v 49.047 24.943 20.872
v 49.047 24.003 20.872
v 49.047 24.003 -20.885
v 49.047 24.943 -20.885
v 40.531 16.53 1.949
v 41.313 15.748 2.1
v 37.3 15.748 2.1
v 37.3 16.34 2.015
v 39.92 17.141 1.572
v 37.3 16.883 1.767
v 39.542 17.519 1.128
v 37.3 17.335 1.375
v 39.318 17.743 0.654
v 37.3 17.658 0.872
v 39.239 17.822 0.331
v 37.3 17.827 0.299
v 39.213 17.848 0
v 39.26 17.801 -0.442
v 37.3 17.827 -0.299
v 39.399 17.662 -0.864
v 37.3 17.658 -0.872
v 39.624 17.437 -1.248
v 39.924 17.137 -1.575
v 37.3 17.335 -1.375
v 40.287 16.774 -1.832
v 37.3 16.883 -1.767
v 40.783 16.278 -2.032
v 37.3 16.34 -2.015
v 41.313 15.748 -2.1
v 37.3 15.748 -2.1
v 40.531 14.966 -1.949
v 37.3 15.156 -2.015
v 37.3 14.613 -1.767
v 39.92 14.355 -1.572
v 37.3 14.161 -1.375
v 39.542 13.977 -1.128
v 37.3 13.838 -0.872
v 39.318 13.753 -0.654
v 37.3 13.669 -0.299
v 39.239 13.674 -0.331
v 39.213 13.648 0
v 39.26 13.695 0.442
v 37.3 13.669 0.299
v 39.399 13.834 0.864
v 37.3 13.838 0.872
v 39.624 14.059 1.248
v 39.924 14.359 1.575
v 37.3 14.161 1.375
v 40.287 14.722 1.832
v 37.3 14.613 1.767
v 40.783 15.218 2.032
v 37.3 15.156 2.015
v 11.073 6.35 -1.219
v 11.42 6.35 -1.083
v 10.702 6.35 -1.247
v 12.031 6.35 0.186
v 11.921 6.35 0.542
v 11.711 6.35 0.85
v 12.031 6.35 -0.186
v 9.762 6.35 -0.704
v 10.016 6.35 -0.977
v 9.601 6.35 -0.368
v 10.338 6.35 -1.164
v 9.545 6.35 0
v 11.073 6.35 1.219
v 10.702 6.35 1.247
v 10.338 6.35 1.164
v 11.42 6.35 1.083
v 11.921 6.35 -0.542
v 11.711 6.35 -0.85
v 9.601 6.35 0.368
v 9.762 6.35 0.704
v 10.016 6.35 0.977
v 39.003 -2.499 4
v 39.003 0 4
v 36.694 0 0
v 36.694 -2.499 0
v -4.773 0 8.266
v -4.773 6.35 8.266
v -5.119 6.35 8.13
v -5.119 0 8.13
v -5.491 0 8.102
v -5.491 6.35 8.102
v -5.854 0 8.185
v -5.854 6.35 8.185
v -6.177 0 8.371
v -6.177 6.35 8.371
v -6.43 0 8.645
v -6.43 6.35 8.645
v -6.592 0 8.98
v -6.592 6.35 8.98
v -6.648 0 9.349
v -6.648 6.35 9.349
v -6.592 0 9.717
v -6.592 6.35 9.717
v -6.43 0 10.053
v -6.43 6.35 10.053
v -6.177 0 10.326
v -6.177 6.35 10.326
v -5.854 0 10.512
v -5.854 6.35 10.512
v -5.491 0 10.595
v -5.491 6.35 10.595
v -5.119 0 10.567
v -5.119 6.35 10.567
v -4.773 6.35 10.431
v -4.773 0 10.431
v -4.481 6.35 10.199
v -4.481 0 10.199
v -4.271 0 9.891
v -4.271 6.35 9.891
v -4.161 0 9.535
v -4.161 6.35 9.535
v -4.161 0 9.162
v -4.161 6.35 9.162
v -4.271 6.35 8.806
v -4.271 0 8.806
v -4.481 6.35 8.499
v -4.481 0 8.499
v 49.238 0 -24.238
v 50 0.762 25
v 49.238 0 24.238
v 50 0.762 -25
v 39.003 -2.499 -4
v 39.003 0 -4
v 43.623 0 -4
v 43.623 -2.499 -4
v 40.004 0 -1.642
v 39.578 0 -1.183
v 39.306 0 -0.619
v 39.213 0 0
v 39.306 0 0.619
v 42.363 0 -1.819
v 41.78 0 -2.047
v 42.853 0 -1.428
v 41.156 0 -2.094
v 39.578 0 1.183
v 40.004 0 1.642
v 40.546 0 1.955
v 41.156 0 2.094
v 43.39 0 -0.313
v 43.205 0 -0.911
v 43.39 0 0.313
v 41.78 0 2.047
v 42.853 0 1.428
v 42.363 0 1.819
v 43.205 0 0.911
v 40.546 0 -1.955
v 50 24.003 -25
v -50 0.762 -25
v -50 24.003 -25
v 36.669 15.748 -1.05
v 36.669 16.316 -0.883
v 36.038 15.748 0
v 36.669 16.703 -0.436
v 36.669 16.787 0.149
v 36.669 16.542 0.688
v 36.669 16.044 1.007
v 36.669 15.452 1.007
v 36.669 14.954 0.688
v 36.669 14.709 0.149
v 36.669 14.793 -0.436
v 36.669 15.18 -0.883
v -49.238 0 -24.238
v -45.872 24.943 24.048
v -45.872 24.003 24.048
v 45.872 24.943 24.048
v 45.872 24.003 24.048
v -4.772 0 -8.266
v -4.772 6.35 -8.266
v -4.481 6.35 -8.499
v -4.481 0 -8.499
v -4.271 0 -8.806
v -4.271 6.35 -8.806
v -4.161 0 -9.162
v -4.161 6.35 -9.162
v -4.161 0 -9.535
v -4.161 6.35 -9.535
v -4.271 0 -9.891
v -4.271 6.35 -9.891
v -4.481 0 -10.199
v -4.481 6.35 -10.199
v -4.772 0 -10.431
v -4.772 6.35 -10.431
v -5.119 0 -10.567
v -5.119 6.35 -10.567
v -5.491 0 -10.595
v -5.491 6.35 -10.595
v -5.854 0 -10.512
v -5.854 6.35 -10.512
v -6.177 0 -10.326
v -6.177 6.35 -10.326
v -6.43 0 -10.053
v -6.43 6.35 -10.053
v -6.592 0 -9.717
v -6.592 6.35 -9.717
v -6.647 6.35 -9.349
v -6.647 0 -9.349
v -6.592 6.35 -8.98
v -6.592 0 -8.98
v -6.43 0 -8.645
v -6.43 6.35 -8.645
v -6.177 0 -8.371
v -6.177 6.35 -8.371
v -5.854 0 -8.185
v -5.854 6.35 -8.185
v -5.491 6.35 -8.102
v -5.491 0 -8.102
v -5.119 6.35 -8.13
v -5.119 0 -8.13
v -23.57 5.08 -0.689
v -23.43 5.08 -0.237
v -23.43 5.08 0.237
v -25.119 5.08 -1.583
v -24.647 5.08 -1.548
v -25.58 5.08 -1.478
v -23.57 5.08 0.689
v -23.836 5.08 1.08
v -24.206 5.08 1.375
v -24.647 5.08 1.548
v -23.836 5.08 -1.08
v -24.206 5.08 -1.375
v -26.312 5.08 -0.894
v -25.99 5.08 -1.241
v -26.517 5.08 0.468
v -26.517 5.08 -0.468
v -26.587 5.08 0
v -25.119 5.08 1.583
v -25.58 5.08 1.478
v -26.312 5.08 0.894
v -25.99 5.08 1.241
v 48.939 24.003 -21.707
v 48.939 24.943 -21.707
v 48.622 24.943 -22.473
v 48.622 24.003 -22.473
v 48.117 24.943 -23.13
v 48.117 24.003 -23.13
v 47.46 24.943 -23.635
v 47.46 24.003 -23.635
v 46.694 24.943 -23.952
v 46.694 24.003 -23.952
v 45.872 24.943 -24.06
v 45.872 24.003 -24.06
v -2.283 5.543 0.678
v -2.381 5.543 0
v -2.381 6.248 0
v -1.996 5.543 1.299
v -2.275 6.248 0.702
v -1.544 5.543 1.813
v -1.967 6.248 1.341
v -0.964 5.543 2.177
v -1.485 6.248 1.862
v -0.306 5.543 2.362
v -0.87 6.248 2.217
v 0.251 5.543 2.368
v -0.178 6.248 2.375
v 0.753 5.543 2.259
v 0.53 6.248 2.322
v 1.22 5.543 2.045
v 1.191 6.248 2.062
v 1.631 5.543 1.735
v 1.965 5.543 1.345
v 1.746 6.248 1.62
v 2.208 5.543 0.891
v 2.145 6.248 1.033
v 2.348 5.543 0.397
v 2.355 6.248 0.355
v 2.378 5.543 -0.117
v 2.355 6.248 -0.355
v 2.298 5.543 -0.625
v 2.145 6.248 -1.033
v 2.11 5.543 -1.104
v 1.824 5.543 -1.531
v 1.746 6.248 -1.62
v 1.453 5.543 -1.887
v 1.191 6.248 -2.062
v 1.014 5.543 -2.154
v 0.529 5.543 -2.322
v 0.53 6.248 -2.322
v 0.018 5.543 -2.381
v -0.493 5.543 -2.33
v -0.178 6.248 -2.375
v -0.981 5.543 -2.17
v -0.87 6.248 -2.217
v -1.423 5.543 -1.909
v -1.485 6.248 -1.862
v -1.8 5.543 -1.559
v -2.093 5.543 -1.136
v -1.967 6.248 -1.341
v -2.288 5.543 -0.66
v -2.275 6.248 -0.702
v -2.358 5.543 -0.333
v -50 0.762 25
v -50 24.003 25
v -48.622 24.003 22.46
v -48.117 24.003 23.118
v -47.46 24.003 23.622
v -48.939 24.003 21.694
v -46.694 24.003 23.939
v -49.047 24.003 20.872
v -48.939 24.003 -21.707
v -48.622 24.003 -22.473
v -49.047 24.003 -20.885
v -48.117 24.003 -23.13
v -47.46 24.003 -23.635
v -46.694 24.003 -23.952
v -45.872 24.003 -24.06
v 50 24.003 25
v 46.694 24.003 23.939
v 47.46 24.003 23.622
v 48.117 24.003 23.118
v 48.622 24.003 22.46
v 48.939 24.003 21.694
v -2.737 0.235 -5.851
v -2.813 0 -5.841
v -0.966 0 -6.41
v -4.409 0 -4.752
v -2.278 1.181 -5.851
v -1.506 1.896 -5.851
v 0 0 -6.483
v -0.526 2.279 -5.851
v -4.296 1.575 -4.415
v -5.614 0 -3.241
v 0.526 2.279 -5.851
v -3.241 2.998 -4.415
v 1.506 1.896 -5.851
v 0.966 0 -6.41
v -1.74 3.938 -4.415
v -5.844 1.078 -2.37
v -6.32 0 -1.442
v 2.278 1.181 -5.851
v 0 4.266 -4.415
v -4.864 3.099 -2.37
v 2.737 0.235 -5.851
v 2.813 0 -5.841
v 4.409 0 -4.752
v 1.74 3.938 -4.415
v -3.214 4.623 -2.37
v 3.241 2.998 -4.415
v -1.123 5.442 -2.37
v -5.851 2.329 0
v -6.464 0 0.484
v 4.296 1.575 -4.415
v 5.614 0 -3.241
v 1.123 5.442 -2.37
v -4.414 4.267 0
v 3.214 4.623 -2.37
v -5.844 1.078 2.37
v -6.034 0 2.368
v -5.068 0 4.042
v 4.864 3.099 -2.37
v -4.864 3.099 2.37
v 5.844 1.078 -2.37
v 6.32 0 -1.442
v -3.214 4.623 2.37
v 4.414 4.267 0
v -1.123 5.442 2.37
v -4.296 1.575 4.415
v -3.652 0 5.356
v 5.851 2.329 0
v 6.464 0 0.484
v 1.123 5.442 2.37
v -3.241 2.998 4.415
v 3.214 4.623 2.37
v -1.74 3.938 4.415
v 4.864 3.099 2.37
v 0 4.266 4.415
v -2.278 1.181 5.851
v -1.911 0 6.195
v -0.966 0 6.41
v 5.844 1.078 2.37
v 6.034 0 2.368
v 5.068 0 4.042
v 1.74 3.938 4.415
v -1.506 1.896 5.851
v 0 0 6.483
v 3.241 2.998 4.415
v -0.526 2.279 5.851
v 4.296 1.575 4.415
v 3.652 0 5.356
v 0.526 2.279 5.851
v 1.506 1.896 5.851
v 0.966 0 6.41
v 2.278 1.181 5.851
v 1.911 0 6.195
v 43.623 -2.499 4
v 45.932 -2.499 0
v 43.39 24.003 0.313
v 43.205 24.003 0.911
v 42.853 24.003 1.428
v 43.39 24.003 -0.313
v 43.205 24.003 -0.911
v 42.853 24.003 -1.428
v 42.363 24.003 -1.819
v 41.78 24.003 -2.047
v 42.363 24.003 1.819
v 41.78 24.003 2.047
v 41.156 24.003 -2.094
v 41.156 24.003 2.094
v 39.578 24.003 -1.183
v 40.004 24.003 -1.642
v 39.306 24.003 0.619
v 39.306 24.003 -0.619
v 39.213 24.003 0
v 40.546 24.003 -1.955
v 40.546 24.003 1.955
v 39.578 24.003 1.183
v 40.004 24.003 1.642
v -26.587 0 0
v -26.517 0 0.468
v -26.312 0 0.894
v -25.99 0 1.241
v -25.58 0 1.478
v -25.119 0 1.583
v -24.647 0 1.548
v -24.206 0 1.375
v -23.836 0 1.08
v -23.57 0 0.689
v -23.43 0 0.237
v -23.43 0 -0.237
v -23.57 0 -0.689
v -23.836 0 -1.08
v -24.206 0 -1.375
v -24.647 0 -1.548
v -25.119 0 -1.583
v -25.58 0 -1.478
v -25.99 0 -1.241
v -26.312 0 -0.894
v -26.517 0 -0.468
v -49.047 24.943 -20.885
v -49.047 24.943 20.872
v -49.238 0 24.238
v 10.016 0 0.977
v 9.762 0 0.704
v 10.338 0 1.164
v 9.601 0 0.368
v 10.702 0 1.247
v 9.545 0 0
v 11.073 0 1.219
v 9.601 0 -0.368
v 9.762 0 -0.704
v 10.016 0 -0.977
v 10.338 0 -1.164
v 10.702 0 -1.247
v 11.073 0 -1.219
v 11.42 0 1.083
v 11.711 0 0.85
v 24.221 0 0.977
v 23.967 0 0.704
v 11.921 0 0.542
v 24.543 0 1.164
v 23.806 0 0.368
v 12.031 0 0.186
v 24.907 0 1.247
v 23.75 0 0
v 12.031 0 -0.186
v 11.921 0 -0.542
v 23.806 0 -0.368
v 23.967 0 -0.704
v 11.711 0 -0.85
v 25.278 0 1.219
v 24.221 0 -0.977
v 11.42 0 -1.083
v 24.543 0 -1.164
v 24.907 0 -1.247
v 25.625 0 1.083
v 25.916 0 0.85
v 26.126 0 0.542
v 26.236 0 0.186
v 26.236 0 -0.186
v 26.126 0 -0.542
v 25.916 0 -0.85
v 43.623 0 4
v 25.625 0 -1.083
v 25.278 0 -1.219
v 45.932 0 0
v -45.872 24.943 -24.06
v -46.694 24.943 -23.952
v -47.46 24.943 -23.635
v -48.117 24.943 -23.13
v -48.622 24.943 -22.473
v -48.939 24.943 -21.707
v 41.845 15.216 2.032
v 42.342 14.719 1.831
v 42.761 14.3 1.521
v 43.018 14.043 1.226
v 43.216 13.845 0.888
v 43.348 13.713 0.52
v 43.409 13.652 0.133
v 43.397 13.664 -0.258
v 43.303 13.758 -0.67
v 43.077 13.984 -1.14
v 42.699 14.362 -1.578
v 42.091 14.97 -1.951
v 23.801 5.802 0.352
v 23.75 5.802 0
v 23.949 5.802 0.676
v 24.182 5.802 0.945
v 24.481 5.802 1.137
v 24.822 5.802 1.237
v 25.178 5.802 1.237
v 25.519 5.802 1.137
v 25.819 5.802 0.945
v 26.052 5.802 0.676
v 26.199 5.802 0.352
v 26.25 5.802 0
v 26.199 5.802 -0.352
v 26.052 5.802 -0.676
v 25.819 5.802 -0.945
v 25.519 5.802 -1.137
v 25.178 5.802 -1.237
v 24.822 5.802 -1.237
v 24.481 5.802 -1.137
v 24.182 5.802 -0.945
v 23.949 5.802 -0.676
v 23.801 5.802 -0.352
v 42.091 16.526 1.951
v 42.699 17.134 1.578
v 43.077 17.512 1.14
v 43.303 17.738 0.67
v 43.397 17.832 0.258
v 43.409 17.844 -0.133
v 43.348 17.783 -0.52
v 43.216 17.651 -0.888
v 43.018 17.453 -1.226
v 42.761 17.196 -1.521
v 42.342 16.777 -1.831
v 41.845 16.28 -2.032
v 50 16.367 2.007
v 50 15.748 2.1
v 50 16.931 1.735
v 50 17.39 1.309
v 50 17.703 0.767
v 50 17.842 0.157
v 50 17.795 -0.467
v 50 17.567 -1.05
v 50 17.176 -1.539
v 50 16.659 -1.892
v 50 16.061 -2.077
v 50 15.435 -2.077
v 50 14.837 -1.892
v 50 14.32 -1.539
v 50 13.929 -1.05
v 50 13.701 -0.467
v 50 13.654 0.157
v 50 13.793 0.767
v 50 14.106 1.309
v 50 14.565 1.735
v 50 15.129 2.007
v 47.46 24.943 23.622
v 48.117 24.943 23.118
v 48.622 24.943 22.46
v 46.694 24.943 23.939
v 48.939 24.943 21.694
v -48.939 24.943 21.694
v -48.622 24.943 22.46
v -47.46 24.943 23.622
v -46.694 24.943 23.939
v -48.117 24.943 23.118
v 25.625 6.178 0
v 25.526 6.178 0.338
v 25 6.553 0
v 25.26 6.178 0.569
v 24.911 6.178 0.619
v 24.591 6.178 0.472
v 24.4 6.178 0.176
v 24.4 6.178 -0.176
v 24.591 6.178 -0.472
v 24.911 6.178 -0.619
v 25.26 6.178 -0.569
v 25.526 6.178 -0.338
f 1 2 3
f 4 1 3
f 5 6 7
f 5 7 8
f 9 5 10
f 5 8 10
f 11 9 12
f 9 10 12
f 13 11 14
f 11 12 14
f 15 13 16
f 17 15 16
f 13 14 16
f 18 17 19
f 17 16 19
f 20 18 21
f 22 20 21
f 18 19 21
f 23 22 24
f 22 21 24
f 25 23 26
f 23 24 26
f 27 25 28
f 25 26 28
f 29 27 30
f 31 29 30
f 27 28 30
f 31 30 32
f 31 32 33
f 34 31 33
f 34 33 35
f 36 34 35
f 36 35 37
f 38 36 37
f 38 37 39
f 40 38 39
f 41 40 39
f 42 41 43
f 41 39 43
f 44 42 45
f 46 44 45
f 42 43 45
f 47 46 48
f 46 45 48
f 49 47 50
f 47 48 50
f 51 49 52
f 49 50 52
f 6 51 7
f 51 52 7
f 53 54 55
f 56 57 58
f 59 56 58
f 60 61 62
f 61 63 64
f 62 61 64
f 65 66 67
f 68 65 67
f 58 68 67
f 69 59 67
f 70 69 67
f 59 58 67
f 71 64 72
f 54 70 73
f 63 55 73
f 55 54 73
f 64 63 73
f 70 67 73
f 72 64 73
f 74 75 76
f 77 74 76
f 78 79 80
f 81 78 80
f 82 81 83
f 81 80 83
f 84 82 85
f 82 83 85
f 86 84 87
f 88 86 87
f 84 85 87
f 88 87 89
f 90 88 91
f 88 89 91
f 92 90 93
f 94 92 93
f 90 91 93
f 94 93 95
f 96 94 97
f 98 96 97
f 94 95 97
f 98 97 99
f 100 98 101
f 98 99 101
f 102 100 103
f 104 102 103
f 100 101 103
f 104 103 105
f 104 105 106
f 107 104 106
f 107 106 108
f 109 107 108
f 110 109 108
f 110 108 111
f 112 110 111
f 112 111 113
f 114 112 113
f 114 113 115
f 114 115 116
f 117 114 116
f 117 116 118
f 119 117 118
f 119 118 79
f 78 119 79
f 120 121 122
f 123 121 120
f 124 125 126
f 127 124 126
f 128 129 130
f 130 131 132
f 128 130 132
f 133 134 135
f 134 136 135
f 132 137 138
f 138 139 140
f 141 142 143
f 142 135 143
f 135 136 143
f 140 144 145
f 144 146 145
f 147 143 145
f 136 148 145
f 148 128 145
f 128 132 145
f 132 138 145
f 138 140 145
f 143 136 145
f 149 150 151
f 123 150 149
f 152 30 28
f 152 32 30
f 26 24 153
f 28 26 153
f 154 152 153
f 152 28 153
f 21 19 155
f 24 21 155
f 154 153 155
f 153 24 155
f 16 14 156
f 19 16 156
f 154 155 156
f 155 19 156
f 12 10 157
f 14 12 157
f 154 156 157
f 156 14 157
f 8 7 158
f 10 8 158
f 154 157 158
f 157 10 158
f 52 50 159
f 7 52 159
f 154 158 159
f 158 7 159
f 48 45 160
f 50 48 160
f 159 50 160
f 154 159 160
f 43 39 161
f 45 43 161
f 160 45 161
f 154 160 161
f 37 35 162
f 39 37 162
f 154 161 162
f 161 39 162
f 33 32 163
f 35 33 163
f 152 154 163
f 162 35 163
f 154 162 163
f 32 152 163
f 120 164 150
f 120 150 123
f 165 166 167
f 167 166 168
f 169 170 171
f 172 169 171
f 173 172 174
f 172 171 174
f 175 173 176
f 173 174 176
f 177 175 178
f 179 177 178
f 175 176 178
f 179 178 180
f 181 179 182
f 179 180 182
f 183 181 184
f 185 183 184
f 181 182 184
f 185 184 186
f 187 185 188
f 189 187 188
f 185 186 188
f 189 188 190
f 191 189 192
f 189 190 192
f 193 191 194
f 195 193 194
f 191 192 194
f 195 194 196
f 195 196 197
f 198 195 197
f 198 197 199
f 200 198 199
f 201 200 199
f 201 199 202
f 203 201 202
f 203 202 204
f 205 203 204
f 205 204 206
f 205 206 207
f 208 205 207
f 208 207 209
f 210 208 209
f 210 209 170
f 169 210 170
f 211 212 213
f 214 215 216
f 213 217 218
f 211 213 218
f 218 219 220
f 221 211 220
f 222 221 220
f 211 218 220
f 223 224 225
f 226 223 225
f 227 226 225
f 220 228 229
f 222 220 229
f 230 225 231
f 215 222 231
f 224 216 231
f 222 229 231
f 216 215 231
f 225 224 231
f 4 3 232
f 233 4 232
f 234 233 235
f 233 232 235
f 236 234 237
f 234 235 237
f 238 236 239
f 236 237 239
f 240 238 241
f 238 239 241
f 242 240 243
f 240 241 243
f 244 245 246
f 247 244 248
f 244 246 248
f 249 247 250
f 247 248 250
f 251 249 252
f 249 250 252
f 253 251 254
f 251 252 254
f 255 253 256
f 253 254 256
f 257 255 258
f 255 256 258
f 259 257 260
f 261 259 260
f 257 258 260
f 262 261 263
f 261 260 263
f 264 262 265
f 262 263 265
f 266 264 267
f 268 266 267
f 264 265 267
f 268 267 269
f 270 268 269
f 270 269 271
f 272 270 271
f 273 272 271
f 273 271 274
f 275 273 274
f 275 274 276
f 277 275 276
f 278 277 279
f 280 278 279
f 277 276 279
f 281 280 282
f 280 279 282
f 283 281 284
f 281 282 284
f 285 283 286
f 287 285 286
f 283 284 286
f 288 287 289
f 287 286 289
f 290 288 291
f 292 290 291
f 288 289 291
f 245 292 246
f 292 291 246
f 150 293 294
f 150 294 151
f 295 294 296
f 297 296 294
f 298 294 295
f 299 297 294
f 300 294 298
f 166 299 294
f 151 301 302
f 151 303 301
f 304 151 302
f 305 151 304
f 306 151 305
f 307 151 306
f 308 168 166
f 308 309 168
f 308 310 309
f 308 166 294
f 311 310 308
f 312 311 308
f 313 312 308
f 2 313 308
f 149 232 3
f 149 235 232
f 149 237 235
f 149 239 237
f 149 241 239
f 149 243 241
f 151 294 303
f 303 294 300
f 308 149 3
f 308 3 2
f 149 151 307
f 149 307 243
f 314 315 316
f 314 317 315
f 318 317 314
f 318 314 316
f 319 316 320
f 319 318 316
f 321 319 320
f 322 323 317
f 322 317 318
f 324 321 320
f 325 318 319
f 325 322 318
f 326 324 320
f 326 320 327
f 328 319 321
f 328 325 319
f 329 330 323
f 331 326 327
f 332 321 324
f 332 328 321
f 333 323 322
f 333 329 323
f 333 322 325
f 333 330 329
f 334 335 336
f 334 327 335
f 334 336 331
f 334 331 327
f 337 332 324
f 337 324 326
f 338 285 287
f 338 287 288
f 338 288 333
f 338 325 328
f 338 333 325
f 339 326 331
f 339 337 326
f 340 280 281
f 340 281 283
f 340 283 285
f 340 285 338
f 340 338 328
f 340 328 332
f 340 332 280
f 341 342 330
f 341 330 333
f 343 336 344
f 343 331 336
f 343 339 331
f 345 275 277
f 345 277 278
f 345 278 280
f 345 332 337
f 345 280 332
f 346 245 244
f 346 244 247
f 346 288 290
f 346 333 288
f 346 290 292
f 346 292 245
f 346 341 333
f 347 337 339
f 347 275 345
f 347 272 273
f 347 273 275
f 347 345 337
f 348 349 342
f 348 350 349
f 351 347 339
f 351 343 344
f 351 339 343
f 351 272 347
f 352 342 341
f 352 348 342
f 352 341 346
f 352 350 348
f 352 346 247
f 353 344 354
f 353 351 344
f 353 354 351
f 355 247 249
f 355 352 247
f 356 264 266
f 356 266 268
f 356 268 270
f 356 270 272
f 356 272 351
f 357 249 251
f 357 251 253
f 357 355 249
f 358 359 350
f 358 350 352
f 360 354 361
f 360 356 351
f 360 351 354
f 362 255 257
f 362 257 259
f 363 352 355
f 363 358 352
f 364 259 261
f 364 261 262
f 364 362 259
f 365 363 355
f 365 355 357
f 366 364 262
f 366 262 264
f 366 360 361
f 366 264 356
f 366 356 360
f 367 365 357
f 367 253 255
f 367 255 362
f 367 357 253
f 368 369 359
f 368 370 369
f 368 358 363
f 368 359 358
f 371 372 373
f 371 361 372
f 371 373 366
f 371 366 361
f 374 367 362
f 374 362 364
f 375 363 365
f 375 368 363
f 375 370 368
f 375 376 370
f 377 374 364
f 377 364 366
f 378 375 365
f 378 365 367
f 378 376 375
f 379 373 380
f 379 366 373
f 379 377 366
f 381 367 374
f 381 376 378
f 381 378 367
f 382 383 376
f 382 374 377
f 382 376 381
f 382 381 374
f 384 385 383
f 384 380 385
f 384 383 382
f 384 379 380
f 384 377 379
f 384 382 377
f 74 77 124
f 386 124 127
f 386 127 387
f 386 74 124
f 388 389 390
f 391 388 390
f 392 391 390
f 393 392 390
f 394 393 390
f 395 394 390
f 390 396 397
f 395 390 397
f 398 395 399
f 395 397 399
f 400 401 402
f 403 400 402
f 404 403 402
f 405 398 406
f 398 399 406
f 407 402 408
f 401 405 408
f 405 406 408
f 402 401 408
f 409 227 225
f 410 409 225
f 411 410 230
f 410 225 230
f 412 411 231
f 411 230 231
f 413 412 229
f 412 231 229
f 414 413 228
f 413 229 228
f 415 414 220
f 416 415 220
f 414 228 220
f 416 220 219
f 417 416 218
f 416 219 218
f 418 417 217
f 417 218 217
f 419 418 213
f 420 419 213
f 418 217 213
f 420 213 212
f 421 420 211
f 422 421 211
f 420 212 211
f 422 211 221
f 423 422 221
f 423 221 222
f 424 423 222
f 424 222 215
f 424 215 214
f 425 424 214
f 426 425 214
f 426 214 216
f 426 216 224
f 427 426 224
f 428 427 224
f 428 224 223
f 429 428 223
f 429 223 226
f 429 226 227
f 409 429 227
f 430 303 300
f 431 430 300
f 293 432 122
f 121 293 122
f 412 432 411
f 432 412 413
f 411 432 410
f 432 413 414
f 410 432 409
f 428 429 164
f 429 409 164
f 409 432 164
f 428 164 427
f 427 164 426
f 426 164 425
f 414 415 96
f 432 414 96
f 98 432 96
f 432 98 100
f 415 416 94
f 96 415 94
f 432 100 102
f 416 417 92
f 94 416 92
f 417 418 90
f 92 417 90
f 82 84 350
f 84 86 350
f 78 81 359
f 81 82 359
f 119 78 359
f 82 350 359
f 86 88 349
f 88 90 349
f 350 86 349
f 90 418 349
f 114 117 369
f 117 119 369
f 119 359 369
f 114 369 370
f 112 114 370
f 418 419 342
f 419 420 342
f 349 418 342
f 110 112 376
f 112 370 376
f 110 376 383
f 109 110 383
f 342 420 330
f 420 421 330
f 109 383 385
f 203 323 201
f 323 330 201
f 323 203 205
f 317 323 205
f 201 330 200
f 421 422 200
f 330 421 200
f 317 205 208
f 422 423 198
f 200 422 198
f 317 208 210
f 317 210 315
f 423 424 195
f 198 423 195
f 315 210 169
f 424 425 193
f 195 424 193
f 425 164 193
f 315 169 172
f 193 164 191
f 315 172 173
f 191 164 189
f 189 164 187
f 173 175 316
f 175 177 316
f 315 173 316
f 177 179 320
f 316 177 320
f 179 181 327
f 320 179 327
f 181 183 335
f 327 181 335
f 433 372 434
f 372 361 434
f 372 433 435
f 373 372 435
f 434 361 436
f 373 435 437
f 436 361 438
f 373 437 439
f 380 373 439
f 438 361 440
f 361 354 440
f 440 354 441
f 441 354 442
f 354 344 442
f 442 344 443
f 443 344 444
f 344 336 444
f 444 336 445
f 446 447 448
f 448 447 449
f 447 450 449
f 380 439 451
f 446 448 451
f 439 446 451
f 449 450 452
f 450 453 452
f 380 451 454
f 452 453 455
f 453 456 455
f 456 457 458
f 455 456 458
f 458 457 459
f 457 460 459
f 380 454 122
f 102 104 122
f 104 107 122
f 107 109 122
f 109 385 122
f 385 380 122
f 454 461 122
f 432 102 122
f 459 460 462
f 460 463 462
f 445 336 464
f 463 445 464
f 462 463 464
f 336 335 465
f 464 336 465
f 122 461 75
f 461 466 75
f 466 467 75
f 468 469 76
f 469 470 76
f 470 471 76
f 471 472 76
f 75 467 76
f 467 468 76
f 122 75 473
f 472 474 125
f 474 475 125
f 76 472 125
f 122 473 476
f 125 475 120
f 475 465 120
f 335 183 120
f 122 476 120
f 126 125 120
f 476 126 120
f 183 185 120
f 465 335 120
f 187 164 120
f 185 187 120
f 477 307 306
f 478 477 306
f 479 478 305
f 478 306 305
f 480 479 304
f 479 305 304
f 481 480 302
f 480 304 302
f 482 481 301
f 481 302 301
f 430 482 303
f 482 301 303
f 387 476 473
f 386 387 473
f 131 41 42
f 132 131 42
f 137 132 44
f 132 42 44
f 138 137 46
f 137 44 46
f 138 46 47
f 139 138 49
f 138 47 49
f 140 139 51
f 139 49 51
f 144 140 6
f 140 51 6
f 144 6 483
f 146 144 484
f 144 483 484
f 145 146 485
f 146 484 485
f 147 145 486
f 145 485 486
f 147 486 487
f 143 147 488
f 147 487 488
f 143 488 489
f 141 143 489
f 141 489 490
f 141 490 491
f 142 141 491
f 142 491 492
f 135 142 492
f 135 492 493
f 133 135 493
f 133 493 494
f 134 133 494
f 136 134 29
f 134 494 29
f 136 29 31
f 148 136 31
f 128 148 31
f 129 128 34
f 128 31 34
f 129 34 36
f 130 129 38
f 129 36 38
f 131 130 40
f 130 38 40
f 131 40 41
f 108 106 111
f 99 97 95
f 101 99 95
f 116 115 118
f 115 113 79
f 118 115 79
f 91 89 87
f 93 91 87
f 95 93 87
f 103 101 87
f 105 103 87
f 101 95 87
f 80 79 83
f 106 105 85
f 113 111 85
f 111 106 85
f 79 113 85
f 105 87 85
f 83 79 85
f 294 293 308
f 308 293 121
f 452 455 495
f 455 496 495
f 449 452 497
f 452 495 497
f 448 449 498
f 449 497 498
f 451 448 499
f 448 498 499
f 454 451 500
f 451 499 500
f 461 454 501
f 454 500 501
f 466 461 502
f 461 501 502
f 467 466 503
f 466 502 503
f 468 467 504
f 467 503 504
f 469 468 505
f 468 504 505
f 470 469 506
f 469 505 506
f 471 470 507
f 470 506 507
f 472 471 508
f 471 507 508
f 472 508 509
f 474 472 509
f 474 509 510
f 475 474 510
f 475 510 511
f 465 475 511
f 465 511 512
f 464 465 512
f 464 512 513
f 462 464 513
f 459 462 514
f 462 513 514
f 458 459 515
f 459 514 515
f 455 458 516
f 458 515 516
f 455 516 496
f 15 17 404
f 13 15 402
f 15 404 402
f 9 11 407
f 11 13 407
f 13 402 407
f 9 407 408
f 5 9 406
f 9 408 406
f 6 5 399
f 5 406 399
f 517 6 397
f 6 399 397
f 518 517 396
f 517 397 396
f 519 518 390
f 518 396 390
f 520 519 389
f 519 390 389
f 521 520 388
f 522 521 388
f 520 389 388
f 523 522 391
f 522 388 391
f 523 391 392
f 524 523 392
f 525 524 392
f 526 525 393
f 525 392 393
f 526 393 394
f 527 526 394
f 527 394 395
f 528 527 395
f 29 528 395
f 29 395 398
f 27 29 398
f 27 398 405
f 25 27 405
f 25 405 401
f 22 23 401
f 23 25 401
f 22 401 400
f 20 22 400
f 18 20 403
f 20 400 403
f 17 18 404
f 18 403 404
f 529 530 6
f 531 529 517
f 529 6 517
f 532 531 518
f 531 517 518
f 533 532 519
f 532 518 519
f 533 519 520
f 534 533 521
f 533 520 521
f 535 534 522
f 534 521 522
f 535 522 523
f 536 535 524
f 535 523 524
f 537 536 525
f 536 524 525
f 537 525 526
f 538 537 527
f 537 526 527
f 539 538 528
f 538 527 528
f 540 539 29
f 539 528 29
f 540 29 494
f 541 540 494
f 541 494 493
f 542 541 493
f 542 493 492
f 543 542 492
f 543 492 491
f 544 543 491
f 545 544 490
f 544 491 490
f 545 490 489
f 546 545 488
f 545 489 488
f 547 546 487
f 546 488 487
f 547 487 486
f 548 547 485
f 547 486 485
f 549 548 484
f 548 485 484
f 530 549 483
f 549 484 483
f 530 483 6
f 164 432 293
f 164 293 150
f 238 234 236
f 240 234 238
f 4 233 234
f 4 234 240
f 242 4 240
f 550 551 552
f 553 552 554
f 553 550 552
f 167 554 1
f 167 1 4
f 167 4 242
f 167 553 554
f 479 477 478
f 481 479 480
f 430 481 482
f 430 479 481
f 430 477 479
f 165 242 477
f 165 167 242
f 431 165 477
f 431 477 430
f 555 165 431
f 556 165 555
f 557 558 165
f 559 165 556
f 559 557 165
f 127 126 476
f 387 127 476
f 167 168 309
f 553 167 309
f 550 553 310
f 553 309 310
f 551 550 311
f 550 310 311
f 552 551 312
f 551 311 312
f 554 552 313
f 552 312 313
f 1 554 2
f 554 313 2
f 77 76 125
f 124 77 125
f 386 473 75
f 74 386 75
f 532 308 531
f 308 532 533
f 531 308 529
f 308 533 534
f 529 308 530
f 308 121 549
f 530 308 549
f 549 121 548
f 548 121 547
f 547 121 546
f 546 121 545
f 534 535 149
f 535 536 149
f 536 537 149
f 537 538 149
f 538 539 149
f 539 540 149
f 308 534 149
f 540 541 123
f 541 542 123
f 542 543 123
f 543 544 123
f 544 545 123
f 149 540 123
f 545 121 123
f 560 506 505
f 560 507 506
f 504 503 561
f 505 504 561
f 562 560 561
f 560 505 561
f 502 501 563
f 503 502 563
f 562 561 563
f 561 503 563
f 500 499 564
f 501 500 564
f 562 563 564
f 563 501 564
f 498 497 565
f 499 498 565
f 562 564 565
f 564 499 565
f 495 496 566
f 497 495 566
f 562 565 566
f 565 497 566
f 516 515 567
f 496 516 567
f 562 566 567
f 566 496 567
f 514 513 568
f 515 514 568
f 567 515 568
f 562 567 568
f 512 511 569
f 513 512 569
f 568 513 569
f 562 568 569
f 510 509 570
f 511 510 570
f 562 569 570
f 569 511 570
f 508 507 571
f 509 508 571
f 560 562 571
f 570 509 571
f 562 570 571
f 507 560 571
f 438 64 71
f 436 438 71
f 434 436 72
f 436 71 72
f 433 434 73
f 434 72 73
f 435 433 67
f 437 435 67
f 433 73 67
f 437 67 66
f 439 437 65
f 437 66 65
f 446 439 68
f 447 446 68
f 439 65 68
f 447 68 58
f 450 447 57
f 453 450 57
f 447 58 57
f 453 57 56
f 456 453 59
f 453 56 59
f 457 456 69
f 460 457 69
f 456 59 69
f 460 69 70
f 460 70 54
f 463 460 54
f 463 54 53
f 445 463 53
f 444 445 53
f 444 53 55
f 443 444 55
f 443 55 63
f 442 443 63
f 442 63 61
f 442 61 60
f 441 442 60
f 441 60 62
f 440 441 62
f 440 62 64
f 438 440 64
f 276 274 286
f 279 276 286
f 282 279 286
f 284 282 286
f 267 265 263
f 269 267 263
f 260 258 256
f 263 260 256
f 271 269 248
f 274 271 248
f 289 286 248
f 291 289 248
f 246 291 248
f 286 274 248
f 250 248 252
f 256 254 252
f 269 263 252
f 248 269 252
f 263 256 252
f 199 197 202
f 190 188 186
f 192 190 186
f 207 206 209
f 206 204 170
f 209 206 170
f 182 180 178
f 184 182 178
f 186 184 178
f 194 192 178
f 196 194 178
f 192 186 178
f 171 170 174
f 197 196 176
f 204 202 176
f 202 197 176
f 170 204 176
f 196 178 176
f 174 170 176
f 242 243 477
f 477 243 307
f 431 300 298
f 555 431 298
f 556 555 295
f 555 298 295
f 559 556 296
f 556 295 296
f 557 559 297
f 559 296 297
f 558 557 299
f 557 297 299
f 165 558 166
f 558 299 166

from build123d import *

# Parameters (mm, degrees)
SKETCH1_W                          = 99.9998
SKETCH1_H                          = 50
MAIN_EXTRUDE_DEPTH                 = 24.003
F_1_8_0_125_DIAMETER_HOLE1_D       = 3.175
F_1_8_0_125_DIAMETER_HOLE1_DEPTH   = 5.08
M3X0_5_TAPPED_HOLE1_D              = 2.5
M3X0_5_TAPPED_HOLE1_DEPTH          = 6.35
CIRPATTERN1_COUNT                  = 3
F_3_16_0_1875_DIAMETER_HOLE1_D     = 4.7625
F_3_16_0_1875_DIAMETER_HOLE1_DEPTH = 6.2484
M3X0_5_TAPPED_HOLE2_D              = 2.5
M3X0_5_TAPPED_HOLE2_DEPTH          = 5.801995
M3X0_5_TAPPED_HOLE2_TIP            = 0.751075774
M5X0_8_TAPPED_HOLE2_D              = 4.2
M5X0_8_TAPPED_HOLE2_DEPTH          = 12.7
M5X0_8_TAPPED_HOLE2_TIP            = 1.2618073
M5X0_8_TAPPED_HOLE1_D              = 4.2
CHAMFER1_SIZE                      = 0.762
EXTRUDE1_DEPTH                     = 0.9398
EXTRUDE2_DEPTH                     = 2.49936


with BuildPart() as part:
    # Sketch1 → Main Extrude (new body)
    with BuildSketch(Plane(origin=(0, 0, 0), x_dir=(1, 0, 0), z_dir=(0, 1, 0))):
        Rectangle(SKETCH1_W, SKETCH1_H)
    extrude(amount=MAIN_EXTRUDE_DEPTH)

    # 1_8 _0.125_ Diameter Hole1
    with Locations(Plane.XZ):
        with Locations((-24.9999, 0)):
            Hole(F_1_8_0_125_DIAMETER_HOLE1_D / 2, depth=F_1_8_0_125_DIAMETER_HOLE1_DEPTH)

    # M3x0.5 Tapped Hole1
    with Locations(Plane.XZ):
        with Locations((10.795, 0)):
            m3x0_5_tapped_hole1 = Hole(M3X0_5_TAPPED_HOLE1_D / 2, depth=M3X0_5_TAPPED_HOLE1_DEPTH)

    # CirPattern1: M3x0.5 Tapped Hole1 ×3 about axis
    cirpattern1_axis = Axis((0, 0, 0), (0, 1, 0))
    for i in range(1, CIRPATTERN1_COUNT):
        add(m3x0_5_tapped_hole1.rotate(cirpattern1_axis, i * 360 / CIRPATTERN1_COUNT), mode=Mode.SUBTRACT)

    # 3_16 _0.1875_ Diameter Hole1
    with Locations(Plane.XZ):
        with Locations((0, 0)):
            Hole(F_3_16_0_1875_DIAMETER_HOLE1_D / 2, depth=F_3_16_0_1875_DIAMETER_HOLE1_DEPTH)

    # Sketch12 → Cut-Revolve1 (revolve, cut)
    with BuildSketch(Plane.XZ.offset(0.508)):
        with BuildLine():
            Line((0, 6.5024), (0, -6.5024))
            ThreePointArc((0, -6.5024), (6.5024, 0), (0, 6.5024))
        make_face()
    revolve(axis=Axis((0, -0.508, 6.5024), (0, 0, -1)), mode=Mode.SUBTRACT)

    # M3x0.5 Tapped Hole2
    with Locations(Plane.XZ):
        with Locations((25.0001, 0)):
            Hole(M3X0_5_TAPPED_HOLE2_D / 2, depth=M3X0_5_TAPPED_HOLE2_DEPTH)
            with Locations((0, 0, -(M3X0_5_TAPPED_HOLE2_DEPTH + M3X0_5_TAPPED_HOLE2_TIP / 2))):  # 118° drill point
                Cone(0, M3X0_5_TAPPED_HOLE2_D / 2, M3X0_5_TAPPED_HOLE2_TIP, mode=Mode.SUBTRACT)

    # M5x0.8 Tapped Hole2
    with Locations(Plane(origin=(49.9999, 0, 0), x_dir=(0, 0, -1), z_dir=(1, 0, 0))):
        with Locations((0, 15.748)):
            Hole(M5X0_8_TAPPED_HOLE2_D / 2, depth=M5X0_8_TAPPED_HOLE2_DEPTH)
            with Locations((0, 0, -(M5X0_8_TAPPED_HOLE2_DEPTH + M5X0_8_TAPPED_HOLE2_TIP / 2))):  # 118° drill point
                Cone(0, M5X0_8_TAPPED_HOLE2_D / 2, M5X0_8_TAPPED_HOLE2_TIP, mode=Mode.SUBTRACT)

    # M5x0.8 Tapped Hole1 (through all)
    with Locations(Plane.XZ):
        with Locations((41.3131, 0)):
            Hole(M5X0_8_TAPPED_HOLE1_D / 2)

    # Chamfer1
    chamfer1_edges = [part.edges().sort_by_distance(p)[0] for p in [
        (0, 0, -25),
        (49.9999, 0, 0),
        (0, 0, 25),
        (-49.9999, 0, 0),
    ]]
    chamfer(chamfer1_edges, length=CHAMFER1_SIZE)

    # Sketch2 → Extrude1 (add)
    with BuildSketch(Plane(origin=(0, 24.003, 0), x_dir=(-1, 0, 0), z_dir=(0, 1, 0))):
        with BuildLine():
            Line((45.8724, 24.0475), (-45.8724, 24.0475))
            ThreePointArc((-45.8724, 24.0475), (-48.11746403, 23.11756403), (-49.0474, 20.8725))
            Line((-49.0474, 20.8725), (-49.0474, -20.8851))
            ThreePointArc((-49.0474, -20.8851), (-48.11746403, -23.13016403), (-45.8724, -24.0601))
            Line((-45.8724, -24.0601), (45.8724, -24.0601))
            ThreePointArc((45.8724, -24.0601), (48.11746403, -23.13016403), (49.0474, -20.8851))
            Line((49.0474, -20.8851), (49.0474, 20.8725))
            ThreePointArc((49.0474, 20.8725), (48.11746403, 23.11756403), (45.8724, 24.0475))
        make_face()
    extrude(amount=EXTRUDE1_DEPTH)

    # Sketch19 → Extrude2 (add)
    with BuildSketch(Plane.XZ):
        Polygon((36.693720496, 0), (39.003410248, -4.0005), (43.622789752, -4.0005), (45.932479504, 0), (43.622789752, 4.0005), (39.003410248, 4.0005), align=None)
    extrude(amount=EXTRUDE2_DEPTH)


solid = part.part
